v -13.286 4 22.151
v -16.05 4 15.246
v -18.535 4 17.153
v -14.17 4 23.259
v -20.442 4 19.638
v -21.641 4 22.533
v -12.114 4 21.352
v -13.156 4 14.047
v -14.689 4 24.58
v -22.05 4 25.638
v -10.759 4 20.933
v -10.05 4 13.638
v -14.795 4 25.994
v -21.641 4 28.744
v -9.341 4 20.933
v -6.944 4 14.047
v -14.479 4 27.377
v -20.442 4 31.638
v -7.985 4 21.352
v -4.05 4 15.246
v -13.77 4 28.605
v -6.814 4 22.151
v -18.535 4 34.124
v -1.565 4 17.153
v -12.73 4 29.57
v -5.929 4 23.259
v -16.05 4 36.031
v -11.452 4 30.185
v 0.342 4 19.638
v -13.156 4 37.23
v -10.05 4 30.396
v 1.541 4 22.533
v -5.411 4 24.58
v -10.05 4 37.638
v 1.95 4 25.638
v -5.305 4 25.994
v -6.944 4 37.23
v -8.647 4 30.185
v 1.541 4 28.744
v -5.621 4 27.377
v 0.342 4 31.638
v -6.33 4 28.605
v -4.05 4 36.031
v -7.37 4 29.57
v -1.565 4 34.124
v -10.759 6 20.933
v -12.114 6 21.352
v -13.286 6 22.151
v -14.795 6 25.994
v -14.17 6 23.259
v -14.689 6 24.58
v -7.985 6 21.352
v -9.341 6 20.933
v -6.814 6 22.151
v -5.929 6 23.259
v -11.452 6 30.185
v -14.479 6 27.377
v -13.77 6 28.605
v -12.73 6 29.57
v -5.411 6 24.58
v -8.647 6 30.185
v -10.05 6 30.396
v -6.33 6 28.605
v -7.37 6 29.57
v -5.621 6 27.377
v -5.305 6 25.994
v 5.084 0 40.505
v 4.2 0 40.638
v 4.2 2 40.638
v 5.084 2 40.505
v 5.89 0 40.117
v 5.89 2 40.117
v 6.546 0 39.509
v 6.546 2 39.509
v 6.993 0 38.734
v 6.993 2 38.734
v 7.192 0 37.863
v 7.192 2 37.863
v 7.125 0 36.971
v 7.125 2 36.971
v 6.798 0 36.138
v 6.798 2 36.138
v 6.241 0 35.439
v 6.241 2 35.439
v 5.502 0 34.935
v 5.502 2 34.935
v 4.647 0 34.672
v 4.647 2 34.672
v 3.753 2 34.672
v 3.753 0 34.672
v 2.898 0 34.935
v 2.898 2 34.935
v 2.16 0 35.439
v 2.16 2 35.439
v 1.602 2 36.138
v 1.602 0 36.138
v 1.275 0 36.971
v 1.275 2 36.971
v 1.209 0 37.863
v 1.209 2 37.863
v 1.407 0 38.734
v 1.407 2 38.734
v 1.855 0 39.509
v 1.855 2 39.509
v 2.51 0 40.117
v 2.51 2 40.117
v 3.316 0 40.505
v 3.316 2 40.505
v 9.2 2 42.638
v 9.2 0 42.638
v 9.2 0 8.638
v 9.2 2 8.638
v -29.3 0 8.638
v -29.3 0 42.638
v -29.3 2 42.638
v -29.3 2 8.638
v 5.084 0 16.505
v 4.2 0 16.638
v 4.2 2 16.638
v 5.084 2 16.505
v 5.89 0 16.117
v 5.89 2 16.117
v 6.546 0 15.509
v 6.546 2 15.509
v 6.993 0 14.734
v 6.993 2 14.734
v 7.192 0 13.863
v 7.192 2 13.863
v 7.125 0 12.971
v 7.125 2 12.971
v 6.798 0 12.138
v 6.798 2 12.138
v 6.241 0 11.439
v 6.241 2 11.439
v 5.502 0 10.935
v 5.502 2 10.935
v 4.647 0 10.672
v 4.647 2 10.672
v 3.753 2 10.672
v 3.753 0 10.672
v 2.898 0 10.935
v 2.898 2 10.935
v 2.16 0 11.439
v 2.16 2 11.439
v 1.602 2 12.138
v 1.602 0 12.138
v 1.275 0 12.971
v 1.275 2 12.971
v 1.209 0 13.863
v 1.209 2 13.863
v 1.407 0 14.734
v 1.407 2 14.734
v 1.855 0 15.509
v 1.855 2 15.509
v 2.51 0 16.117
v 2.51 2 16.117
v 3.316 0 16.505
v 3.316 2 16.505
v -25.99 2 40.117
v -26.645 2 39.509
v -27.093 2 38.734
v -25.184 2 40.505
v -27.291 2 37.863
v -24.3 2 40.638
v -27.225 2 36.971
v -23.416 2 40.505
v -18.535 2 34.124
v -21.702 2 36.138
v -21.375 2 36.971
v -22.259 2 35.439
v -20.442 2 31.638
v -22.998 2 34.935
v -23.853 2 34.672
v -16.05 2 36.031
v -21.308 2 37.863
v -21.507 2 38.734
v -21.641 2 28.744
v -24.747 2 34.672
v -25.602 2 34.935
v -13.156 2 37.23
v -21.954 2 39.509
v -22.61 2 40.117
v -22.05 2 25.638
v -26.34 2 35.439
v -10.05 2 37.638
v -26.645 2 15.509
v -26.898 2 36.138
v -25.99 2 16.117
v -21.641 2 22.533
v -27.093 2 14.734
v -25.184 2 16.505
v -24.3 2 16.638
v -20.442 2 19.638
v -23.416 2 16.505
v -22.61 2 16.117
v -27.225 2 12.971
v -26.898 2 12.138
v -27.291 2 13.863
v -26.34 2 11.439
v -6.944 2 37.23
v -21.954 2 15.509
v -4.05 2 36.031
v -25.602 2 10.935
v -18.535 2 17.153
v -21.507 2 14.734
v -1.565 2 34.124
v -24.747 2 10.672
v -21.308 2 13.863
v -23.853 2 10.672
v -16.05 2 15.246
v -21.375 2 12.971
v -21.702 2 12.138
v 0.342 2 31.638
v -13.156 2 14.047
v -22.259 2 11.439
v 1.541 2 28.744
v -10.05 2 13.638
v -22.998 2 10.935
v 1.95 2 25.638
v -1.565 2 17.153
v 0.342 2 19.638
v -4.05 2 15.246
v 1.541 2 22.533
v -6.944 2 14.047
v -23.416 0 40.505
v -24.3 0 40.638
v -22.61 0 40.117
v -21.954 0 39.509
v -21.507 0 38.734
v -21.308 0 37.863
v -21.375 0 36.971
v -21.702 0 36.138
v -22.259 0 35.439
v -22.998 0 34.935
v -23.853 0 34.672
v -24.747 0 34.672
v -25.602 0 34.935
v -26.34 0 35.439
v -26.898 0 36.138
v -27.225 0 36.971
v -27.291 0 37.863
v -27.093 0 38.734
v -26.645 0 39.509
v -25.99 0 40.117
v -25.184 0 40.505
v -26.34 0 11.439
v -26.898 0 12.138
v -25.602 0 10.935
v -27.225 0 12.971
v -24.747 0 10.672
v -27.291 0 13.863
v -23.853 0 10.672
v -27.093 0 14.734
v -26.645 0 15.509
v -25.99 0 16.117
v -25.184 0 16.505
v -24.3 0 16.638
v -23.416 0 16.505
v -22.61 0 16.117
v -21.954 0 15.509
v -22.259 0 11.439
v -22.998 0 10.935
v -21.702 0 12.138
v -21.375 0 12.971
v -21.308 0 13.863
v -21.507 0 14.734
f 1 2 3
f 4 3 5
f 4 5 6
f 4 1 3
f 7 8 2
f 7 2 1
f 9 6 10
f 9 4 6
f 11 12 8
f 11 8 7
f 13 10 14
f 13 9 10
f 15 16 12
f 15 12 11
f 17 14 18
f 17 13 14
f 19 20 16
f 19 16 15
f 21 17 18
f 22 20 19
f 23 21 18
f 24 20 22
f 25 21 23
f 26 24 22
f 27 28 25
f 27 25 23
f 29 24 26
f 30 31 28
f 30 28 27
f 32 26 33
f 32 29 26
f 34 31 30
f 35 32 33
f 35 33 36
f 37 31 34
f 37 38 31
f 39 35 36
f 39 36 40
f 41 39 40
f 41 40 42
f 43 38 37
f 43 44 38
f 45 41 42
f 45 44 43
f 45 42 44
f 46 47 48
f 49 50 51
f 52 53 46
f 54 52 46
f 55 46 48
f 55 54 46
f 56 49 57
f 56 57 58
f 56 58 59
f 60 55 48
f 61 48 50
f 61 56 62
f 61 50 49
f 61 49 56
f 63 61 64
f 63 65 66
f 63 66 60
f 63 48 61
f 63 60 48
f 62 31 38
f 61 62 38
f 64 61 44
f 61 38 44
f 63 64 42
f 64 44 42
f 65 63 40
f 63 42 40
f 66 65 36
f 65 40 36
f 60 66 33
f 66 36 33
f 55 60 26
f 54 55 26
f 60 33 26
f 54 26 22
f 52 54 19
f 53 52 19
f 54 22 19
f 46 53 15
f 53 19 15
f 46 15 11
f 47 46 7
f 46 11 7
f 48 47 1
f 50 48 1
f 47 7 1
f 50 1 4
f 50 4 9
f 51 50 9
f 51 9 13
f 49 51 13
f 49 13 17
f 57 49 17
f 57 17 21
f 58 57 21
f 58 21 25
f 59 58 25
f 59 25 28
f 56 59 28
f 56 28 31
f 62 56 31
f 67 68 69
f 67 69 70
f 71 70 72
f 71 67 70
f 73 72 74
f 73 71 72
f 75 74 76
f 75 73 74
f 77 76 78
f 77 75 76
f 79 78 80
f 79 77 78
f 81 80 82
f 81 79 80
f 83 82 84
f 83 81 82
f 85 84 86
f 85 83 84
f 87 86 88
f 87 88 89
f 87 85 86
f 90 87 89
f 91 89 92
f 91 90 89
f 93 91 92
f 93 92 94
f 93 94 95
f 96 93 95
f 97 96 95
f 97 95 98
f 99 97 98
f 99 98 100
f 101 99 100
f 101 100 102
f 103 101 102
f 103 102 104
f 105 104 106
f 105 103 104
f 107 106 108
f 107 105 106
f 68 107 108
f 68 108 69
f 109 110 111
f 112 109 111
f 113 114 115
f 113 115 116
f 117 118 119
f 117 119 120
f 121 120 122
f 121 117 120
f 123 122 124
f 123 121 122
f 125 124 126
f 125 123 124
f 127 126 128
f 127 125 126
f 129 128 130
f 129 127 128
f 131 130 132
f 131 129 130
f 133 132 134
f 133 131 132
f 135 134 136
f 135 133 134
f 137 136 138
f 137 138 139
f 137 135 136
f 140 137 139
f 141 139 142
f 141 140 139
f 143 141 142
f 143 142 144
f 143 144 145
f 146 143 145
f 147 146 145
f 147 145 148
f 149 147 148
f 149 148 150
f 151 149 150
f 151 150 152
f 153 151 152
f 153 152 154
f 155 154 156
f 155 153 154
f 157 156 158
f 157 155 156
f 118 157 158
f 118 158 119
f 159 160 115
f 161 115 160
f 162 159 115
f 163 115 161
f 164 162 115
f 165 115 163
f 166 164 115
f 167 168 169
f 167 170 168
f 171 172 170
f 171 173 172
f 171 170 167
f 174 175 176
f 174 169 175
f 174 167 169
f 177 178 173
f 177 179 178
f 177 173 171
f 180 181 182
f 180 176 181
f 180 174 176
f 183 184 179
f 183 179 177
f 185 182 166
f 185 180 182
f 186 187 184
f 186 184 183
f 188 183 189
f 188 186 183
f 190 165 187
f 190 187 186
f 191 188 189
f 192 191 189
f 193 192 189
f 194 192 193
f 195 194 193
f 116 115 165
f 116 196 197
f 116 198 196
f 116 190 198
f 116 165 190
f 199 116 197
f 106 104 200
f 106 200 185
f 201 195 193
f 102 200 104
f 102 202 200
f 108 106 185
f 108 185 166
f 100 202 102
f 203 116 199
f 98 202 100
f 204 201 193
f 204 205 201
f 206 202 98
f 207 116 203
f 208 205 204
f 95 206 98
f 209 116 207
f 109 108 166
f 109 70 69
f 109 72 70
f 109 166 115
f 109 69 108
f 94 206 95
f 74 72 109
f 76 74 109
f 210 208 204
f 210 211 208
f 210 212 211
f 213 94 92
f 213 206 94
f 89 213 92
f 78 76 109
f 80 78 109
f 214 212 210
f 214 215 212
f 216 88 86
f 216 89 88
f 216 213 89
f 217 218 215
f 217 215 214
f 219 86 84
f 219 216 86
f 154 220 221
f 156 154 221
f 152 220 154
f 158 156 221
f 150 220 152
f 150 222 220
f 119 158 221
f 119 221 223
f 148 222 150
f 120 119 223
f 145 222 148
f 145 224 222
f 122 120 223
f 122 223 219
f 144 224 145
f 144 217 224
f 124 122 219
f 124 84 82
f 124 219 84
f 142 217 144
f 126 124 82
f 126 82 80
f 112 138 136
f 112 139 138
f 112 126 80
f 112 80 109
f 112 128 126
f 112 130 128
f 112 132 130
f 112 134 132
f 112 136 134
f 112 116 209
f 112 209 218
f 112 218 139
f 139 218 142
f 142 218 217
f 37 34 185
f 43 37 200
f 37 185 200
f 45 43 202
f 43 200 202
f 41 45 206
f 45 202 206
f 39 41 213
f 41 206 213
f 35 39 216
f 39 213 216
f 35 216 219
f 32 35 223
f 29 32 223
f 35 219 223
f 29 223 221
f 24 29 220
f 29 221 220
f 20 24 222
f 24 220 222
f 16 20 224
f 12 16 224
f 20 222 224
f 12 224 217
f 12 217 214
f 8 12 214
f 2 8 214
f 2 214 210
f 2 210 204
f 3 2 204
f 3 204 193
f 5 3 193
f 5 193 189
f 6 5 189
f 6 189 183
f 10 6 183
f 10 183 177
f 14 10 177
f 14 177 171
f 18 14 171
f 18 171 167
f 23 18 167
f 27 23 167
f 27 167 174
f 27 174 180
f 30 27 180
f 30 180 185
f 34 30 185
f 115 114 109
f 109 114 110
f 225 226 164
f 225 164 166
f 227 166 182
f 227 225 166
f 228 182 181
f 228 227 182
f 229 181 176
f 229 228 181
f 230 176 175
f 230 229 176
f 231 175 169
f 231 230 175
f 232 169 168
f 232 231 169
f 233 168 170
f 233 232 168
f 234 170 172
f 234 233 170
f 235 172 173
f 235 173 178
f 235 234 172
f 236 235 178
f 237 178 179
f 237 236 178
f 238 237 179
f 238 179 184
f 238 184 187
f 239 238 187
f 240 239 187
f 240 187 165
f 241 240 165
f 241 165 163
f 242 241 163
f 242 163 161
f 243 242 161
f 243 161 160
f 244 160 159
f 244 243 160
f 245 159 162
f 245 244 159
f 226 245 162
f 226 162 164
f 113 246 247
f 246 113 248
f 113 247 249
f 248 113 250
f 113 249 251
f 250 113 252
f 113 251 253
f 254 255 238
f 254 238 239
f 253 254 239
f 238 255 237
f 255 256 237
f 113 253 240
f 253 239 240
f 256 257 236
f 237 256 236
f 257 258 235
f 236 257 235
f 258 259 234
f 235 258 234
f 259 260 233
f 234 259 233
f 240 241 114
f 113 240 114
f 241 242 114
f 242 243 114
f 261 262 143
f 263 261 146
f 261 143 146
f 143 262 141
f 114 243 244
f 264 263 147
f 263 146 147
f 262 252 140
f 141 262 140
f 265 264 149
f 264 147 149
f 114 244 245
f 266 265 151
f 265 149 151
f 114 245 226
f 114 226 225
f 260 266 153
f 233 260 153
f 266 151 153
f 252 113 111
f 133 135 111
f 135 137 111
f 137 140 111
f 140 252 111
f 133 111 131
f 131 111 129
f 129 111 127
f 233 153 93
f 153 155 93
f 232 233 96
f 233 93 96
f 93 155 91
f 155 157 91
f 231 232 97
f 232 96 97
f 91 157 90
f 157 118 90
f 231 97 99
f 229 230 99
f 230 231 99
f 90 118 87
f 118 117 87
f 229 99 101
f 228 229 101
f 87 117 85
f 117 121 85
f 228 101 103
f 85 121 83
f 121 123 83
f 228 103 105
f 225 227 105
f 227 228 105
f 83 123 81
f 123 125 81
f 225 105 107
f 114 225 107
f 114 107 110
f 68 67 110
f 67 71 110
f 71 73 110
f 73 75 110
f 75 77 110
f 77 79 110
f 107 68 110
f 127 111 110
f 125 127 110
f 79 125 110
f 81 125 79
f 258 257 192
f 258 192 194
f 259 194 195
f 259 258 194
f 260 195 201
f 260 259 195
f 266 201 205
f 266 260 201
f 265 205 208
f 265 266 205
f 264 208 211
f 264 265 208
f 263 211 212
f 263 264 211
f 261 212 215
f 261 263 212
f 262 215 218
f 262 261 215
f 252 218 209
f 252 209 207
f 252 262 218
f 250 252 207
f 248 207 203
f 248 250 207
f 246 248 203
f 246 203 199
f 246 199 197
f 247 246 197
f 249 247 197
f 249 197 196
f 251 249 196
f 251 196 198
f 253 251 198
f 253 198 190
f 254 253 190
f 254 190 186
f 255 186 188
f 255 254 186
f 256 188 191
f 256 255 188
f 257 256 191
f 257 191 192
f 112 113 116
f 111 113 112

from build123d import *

# Parameters (mm, degrees)
SKETCH_3_W      = 38.5
SKETCH_3_H      = 34
SKETCH_3_R      = 3
EXTRUDE_1_DEPTH = 2
SKETCH_4_R      = 12
EXTRUDE_3_DEPTH = 4
SKETCH_6_R      = 4.758056851
EXTRUDE_4_DEPTH = 6


with BuildPart() as part:
    # 草图3 → 凸台-拉伸1 (new body)
    with BuildSketch(Plane(origin=(0, 0, 0), x_dir=(1, 0, 0), z_dir=(0, 1, 0))):
        with Locations((-10.049882631, -25.638405163)):
            Rectangle(SKETCH_3_W, SKETCH_3_H)
        with Locations(Location((-24.299882631, -13.638405163, 0), (0, 0, 270))):
            Circle(SKETCH_3_R, mode=Mode.SUBTRACT)
        with Locations(Location((4.200117369, -13.638405163, 0), (0, 0, 270))):
            Circle(SKETCH_3_R, mode=Mode.SUBTRACT)
        with Locations(Location((-24.299882631, -37.638405163, 0), (0, 0, 270))):
            Circle(SKETCH_3_R, mode=Mode.SUBTRACT)
        with Locations(Location((4.200117369, -37.638405163, 0), (0, 0, 270))):
            Circle(SKETCH_3_R, mode=Mode.SUBTRACT)
    extrude(amount=EXTRUDE_1_DEPTH)

    # 草图4 → 凸台-拉伸3 (add)
    with BuildSketch(Plane(origin=(0, 0, 0), x_dir=(1, 0, 0), z_dir=(0, 1, 0))):
        with Locations(Location((-10.049882631, -25.638405163, 0), (0, 0, 270))):
            Circle(SKETCH_4_R)
    extrude(amount=EXTRUDE_3_DEPTH)

    # 草图6 → 凸台-拉伸4 (add)
    with BuildSketch(Plane(origin=(0, 0, 0), x_dir=(1, 0, 0), z_dir=(0, 1, 0))):
        with Locations(Location((-10.049882631, -25.638405163, 0), (0, 0, 270))):
            Circle(SKETCH_6_R)
    extrude(amount=EXTRUDE_4_DEPTH)


solid = part.part
